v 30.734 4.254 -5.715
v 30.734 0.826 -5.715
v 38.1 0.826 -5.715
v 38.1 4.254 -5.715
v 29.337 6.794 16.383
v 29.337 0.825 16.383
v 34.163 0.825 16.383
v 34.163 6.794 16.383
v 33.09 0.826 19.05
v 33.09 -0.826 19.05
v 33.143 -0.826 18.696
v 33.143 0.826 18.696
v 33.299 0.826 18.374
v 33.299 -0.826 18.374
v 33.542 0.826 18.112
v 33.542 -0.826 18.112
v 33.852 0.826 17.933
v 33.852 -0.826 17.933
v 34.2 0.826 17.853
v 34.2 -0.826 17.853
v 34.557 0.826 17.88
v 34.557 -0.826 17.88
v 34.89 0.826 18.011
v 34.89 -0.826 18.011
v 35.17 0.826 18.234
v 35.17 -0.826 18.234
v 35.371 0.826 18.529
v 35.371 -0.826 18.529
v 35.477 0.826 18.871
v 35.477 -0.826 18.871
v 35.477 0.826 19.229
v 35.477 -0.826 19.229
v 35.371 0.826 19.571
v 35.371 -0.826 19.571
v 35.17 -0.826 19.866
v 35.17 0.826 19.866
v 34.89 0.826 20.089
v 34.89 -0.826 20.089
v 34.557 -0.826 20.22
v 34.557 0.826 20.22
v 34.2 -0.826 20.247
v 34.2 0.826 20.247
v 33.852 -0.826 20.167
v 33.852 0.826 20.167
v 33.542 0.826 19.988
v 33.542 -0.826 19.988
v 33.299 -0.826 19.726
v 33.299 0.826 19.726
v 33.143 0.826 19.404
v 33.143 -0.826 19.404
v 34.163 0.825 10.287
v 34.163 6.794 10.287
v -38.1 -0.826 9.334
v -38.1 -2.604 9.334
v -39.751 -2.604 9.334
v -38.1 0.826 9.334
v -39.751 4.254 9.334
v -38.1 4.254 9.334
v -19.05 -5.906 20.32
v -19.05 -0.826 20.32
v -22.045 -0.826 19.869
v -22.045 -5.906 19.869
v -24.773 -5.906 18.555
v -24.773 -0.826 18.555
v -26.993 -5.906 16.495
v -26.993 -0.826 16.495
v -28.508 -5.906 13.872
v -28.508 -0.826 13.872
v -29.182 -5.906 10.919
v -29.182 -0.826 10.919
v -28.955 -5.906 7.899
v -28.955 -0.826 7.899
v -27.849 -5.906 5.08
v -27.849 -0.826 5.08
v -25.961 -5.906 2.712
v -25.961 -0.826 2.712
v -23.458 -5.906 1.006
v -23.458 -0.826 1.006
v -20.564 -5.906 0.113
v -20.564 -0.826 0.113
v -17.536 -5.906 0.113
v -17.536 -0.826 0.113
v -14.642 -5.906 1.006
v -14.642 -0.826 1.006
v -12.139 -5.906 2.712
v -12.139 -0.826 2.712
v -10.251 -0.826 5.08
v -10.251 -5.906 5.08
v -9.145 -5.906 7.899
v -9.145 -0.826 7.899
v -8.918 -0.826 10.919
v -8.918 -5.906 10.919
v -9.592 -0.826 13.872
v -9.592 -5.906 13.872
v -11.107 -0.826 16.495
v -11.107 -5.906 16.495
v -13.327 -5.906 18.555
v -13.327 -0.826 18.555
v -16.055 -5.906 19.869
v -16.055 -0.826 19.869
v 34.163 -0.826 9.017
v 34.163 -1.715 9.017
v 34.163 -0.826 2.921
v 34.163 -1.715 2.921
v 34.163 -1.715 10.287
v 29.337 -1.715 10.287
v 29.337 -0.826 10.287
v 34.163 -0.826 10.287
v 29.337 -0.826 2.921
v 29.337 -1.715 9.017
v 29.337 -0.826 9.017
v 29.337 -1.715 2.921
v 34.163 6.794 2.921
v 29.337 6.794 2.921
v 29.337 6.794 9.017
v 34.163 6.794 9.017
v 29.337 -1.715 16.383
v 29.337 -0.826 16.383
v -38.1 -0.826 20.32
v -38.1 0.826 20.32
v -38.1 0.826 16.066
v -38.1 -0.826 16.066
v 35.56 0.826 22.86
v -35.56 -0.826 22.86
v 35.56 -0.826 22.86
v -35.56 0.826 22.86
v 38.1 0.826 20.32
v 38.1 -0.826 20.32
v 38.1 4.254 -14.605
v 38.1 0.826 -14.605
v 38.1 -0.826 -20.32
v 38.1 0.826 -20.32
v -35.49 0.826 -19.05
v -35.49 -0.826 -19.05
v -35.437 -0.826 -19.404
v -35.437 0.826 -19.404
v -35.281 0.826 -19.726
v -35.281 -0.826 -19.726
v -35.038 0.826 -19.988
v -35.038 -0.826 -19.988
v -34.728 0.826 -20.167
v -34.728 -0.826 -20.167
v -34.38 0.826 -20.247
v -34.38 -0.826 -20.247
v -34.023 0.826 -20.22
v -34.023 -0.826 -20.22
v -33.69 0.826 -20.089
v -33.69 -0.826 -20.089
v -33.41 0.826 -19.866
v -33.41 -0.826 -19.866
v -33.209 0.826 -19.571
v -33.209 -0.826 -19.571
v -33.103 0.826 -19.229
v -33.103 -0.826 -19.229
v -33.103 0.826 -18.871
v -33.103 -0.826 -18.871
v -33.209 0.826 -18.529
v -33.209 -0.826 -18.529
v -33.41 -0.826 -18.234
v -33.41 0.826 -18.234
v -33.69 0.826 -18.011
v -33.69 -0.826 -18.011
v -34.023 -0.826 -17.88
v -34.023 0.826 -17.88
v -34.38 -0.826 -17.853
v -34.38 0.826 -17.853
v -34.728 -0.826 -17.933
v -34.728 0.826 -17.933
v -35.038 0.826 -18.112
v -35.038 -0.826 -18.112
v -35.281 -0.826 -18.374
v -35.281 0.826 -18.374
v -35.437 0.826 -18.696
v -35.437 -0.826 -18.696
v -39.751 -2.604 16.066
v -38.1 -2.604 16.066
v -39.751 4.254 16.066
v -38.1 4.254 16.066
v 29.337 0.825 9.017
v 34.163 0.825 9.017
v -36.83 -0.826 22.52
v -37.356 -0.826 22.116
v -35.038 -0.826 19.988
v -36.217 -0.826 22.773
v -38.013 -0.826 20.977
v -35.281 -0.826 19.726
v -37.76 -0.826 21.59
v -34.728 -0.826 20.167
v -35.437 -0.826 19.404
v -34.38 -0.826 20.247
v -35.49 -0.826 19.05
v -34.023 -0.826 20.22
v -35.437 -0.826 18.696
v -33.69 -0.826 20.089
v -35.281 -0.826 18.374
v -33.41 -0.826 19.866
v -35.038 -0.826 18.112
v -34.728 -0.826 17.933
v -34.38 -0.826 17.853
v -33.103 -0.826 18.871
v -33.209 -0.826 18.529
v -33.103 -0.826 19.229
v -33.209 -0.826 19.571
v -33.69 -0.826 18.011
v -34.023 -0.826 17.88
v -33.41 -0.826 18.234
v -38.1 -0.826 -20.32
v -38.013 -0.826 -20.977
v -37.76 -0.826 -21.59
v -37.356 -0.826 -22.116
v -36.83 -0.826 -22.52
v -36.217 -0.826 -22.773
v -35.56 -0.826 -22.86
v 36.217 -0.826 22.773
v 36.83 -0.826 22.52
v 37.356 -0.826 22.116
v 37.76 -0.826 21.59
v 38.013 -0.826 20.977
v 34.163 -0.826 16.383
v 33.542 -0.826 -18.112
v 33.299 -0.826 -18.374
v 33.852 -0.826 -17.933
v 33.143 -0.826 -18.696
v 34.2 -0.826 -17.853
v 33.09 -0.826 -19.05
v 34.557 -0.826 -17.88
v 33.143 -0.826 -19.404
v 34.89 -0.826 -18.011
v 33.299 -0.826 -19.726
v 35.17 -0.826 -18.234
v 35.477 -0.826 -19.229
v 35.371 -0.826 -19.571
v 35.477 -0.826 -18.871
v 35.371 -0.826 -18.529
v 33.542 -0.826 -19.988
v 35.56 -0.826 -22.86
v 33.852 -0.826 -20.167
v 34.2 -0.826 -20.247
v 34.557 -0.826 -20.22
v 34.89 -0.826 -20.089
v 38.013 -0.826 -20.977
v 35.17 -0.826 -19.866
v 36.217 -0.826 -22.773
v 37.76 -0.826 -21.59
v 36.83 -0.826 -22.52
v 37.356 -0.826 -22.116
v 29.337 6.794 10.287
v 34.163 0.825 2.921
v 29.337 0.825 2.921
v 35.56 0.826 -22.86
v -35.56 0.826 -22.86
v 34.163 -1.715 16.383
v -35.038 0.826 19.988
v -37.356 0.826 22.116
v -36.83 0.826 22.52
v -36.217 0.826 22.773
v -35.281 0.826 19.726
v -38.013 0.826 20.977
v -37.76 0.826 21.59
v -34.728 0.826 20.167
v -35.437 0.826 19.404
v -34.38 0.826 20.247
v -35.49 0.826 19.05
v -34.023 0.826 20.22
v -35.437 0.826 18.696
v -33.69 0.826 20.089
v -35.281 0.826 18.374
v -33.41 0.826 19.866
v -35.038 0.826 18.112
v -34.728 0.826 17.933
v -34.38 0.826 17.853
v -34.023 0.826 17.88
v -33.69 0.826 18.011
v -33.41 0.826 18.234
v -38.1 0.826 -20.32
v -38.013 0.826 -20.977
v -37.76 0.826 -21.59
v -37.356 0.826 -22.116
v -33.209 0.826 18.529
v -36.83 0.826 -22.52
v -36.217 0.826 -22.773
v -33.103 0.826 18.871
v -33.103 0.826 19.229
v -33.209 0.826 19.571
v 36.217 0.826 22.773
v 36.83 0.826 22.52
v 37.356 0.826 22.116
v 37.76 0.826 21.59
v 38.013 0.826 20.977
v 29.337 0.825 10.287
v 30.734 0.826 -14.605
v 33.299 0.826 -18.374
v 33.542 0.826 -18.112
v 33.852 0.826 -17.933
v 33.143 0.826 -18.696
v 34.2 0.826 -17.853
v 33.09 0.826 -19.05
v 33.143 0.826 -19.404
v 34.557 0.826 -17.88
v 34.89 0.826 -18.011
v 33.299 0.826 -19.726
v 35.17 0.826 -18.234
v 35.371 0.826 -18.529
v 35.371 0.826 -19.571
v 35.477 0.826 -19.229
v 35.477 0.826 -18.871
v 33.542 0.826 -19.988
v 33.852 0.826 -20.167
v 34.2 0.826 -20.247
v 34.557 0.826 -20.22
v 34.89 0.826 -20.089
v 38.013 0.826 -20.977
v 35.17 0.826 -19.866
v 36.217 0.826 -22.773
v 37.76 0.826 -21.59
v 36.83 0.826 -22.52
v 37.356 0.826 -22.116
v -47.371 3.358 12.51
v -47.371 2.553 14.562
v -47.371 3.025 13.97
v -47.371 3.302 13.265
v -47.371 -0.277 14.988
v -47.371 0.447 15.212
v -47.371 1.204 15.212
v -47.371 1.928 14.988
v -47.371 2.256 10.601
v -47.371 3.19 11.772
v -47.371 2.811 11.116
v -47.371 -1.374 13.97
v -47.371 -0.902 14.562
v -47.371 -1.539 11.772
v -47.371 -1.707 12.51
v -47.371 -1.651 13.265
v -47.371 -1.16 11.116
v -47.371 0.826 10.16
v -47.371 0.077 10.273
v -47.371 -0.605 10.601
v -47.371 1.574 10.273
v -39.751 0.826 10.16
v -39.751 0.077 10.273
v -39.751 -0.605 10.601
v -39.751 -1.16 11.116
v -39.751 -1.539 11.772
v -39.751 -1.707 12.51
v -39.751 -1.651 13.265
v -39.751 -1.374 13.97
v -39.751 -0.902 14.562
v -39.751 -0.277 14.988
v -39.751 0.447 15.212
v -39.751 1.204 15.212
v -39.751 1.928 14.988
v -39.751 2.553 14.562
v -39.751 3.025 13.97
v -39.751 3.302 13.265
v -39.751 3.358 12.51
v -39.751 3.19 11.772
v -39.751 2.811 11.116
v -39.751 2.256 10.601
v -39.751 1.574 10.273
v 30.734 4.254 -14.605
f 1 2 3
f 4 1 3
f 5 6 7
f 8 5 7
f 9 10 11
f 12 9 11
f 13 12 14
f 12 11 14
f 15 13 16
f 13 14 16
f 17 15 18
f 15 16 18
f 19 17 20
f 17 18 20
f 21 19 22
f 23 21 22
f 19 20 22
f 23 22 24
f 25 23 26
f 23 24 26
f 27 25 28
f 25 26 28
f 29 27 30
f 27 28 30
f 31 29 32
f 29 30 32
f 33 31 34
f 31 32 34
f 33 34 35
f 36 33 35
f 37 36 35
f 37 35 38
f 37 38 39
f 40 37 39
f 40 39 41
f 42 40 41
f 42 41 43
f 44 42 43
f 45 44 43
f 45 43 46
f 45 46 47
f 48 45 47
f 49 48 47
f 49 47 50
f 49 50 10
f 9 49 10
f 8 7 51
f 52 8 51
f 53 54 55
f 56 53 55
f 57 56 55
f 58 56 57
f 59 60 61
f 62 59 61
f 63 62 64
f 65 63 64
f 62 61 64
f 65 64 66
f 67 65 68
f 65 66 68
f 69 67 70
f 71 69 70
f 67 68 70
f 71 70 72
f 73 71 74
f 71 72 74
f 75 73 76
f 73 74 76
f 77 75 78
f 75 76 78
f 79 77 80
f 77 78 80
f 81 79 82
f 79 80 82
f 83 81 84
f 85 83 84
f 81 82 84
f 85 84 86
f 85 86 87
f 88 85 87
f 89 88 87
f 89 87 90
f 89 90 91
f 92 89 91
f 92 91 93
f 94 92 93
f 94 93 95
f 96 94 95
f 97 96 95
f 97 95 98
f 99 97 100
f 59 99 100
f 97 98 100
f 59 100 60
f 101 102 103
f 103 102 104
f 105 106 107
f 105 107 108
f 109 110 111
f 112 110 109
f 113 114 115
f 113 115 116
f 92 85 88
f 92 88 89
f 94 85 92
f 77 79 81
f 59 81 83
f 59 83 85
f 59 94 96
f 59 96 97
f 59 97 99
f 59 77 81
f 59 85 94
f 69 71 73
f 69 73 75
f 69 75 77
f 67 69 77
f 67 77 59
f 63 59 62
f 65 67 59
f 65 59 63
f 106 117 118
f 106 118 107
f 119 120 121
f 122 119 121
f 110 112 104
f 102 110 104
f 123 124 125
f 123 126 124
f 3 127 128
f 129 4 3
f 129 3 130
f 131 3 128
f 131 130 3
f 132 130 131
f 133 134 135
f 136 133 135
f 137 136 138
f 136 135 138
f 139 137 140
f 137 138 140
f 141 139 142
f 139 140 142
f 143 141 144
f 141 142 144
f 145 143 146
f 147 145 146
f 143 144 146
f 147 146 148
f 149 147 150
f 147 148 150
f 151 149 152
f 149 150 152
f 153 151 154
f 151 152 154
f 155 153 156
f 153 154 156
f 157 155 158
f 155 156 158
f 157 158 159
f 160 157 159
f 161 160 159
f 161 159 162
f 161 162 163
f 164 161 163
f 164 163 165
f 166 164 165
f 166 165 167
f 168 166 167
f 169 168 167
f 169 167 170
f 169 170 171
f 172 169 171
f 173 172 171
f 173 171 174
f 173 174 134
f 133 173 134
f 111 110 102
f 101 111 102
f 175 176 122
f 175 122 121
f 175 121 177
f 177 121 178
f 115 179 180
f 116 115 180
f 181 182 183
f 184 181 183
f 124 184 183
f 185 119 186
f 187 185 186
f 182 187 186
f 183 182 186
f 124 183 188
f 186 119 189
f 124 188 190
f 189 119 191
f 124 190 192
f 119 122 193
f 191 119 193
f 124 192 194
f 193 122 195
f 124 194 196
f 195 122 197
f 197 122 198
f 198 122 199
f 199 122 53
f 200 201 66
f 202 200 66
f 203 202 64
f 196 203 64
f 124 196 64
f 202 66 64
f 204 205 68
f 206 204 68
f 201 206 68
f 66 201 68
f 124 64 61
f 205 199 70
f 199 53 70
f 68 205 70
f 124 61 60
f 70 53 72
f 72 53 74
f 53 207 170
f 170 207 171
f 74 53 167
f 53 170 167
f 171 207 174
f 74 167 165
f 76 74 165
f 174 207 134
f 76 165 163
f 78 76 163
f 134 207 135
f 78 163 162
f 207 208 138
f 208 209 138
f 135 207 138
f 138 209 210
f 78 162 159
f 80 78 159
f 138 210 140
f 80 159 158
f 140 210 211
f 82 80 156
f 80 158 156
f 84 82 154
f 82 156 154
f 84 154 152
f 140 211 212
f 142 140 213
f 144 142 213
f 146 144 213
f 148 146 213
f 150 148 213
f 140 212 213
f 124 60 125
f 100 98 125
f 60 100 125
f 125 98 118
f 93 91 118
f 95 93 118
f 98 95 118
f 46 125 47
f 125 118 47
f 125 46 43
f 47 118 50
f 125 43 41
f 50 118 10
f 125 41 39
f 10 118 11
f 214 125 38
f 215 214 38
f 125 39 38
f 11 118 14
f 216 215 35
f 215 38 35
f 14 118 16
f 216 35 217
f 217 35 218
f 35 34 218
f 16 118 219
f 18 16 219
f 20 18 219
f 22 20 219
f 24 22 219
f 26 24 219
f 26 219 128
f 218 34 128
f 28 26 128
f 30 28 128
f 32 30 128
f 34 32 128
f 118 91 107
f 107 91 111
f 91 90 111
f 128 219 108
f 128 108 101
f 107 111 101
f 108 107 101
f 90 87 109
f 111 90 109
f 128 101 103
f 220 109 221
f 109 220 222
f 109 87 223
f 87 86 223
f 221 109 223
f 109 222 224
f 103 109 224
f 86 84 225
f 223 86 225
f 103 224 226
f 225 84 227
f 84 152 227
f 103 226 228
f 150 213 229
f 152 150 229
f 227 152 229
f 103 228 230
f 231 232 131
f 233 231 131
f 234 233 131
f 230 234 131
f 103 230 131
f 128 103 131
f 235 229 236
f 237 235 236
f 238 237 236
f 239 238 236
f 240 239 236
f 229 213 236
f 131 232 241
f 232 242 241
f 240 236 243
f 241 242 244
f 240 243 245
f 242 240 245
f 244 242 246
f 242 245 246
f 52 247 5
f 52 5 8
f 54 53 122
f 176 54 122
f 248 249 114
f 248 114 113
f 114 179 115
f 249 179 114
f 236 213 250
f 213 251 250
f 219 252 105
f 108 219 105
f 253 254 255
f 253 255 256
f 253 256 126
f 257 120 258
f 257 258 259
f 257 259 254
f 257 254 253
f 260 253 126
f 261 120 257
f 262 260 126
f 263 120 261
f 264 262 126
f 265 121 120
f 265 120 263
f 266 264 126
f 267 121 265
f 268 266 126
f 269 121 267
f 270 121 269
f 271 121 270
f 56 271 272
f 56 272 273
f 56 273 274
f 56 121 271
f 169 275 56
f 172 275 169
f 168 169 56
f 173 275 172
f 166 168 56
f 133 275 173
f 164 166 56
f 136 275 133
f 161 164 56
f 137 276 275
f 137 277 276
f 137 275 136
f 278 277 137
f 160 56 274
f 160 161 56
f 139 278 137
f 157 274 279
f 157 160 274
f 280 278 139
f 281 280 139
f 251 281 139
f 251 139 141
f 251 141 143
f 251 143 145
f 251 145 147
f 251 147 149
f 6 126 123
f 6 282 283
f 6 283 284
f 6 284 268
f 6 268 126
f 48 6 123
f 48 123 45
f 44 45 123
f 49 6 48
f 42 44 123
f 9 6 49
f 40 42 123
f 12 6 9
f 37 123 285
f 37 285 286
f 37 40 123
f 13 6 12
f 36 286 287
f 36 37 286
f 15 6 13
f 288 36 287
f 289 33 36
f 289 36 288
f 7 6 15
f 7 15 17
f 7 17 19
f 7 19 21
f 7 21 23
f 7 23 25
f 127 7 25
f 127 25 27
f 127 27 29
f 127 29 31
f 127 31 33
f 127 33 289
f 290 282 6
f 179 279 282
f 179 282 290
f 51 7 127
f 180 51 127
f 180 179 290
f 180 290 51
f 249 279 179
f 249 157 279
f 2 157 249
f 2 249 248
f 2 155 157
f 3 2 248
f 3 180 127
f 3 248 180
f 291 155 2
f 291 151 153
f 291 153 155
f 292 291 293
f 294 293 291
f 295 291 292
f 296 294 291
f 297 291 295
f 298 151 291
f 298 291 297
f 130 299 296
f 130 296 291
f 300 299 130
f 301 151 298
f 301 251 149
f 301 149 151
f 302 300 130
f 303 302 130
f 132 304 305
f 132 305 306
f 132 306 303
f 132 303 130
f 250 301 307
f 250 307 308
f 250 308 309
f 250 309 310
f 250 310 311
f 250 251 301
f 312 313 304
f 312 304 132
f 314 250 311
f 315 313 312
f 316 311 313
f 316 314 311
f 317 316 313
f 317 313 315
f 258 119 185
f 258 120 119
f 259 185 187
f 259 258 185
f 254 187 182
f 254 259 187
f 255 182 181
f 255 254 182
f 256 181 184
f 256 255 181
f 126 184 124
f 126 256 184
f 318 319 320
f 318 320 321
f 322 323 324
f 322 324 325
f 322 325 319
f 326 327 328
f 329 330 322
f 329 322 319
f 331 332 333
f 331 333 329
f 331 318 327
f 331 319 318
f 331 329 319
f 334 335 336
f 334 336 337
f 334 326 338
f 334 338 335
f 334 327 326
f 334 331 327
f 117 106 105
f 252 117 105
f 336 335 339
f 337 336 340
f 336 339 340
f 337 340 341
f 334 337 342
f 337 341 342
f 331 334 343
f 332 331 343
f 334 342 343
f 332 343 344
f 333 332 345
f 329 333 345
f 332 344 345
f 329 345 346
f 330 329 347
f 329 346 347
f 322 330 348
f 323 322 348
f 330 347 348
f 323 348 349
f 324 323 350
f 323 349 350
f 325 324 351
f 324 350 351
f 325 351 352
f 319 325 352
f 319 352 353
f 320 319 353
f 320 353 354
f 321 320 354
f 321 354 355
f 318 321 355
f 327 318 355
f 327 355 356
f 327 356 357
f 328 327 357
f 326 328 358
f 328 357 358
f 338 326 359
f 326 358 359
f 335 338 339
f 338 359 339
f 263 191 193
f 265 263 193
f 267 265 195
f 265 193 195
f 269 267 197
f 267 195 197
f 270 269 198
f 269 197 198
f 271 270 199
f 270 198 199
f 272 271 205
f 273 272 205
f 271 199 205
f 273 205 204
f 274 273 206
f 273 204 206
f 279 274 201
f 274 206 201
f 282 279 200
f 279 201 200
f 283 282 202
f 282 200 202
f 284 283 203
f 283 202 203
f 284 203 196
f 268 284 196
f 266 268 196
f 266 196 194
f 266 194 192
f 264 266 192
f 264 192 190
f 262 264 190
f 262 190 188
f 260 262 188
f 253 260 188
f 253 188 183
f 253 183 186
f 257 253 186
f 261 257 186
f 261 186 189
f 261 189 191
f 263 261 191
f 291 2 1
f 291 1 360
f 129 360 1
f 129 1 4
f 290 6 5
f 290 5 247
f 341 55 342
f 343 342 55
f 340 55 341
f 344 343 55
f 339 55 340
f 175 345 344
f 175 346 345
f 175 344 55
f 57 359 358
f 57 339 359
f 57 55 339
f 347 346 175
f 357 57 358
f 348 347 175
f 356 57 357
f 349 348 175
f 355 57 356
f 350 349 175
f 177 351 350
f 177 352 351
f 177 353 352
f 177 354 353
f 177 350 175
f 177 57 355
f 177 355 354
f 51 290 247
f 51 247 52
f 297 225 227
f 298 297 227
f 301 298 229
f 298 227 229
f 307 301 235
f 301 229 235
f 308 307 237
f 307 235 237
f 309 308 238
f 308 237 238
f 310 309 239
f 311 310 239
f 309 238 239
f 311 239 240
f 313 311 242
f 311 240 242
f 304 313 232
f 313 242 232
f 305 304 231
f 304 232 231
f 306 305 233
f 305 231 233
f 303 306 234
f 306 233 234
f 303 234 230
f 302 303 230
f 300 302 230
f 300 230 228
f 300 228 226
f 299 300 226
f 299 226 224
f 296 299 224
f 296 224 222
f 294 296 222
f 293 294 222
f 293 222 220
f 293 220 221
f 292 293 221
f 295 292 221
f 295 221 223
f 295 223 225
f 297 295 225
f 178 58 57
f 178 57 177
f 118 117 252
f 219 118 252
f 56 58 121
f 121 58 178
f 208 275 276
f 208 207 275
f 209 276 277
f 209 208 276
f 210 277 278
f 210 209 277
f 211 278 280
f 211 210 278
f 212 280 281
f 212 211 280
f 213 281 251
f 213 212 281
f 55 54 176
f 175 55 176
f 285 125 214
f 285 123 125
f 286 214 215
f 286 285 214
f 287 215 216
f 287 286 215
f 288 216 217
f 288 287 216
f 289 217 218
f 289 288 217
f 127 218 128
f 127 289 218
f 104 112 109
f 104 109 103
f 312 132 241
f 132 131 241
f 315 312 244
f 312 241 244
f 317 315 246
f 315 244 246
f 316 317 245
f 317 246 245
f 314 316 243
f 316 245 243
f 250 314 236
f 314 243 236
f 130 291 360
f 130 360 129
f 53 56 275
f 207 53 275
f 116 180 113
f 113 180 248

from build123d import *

# Parameters (mm, degrees)
SKETCH1_W                = 76.2
SKETCH1_H                = 45.72
BOSS_EXTRUDE1_DEPTH      = 0.8255
SKETCH2_R                = 10.16
BOSS_EXTRUDE2_DEPTH      = 5.08
SKETCH3_W                = 6.731
SKETCH3_H                = 6.858
BOSS_EXTRUDE3_DEPTH      = 1.651
SKETCH4_R                = 2.54
BOSS_EXTRUDE4_DEPTH      = 7.62
BOSS_EXTRUDE5_DEPTH      = 5.969
BOSS_EXTRUDE5_DEPTH_BACK = 2.54
SKETCH5_W                = 4.826
SKETCH5_H                = 6.096
SKETCH6_W                = 7.366
SKETCH6_H                = 8.89
BOSS_EXTRUDE6_DEPTH      = 3.429
M2_CLEARANCE_HOLE1_D     = 2.4
FILLET1_R                = 2.54


with BuildPart() as part:
    # Sketch1 → Boss-Extrude1 (new, symmetric)
    with BuildSketch(Plane(origin=(0, 0, 0), x_dir=(1, 0, 0), z_dir=(0, 1, 0))):
        Rectangle(SKETCH1_W, SKETCH1_H)
    extrude(amount=BOSS_EXTRUDE1_DEPTH, both=True)

    # Sketch2 → Boss-Extrude2 (add)
    with BuildSketch(Plane.XZ.offset(0.8255)):
        with Locations(Location((-19.05, 10.16, 0), (0, 0, 90))):
            Circle(SKETCH2_R)
    extrude(amount=BOSS_EXTRUDE2_DEPTH)

    # Sketch3 → Boss-Extrude3 (add)
    with BuildSketch(Plane.ZY.offset(38.1)):
        with Locations((12.7, 0.8255)):
            Rectangle(SKETCH3_W, SKETCH3_H)
    extrude(amount=BOSS_EXTRUDE3_DEPTH)

    # Sketch4 → Boss-Extrude4 (add)
    with BuildSketch(Plane.ZY.offset(39.751)):
        with Locations(Location((12.7, 0.8255, 0), (0, 0, 180))):
            Circle(SKETCH4_R)
    extrude(amount=BOSS_EXTRUDE4_DEPTH)

    # Sketch5 → Boss-Extrude5 (add, two sides: drawn at the far end of the back side and taken through both)
    with BuildSketch(Plane(origin=(0, 0.8255, 0), x_dir=(1, 0, 0), z_dir=(0, 1, 0)).offset(-BOSS_EXTRUDE5_DEPTH_BACK)):
        with Locations((31.75, -13.335)):
            Rectangle(SKETCH5_W, SKETCH5_H)
        with Locations((31.75, -5.969)):
            Rectangle(SKETCH5_W, SKETCH5_H)
    extrude(amount=BOSS_EXTRUDE5_DEPTH + BOSS_EXTRUDE5_DEPTH_BACK)

    # Sketch6 → Boss-Extrude6 (add)
    with BuildSketch(Plane(origin=(0, 0.8255, 0), x_dir=(1, 0, 0), z_dir=(0, 1, 0))):
        with Locations((34.417, 10.16)):
            Rectangle(SKETCH6_W, SKETCH6_H)
    extrude(amount=BOSS_EXTRUDE6_DEPTH)

    # M2 Clearance Hole1 (through all)
    with Locations(Plane(origin=(0, 0.8255, 0), x_dir=(1, 0, 0), z_dir=(0, 1, 0))):
        with Locations((-34.29, 19.05), (34.29, 19.05), (-34.29, -19.05), (34.29, -19.05)):
            Hole(M2_CLEARANCE_HOLE1_D / 2)

    # Fillet1
    fillet1_edges = [part.edges().sort_by_distance(p)[0] for p in [
        (38.1, 0, 22.86),
        (-38.1, 0, 22.86),
        (-38.1, 0, -22.86),
        (38.1, 0, -22.86),
    ]]
    fillet(fillet1_edges, radius=FILLET1_R)


solid = part.part
